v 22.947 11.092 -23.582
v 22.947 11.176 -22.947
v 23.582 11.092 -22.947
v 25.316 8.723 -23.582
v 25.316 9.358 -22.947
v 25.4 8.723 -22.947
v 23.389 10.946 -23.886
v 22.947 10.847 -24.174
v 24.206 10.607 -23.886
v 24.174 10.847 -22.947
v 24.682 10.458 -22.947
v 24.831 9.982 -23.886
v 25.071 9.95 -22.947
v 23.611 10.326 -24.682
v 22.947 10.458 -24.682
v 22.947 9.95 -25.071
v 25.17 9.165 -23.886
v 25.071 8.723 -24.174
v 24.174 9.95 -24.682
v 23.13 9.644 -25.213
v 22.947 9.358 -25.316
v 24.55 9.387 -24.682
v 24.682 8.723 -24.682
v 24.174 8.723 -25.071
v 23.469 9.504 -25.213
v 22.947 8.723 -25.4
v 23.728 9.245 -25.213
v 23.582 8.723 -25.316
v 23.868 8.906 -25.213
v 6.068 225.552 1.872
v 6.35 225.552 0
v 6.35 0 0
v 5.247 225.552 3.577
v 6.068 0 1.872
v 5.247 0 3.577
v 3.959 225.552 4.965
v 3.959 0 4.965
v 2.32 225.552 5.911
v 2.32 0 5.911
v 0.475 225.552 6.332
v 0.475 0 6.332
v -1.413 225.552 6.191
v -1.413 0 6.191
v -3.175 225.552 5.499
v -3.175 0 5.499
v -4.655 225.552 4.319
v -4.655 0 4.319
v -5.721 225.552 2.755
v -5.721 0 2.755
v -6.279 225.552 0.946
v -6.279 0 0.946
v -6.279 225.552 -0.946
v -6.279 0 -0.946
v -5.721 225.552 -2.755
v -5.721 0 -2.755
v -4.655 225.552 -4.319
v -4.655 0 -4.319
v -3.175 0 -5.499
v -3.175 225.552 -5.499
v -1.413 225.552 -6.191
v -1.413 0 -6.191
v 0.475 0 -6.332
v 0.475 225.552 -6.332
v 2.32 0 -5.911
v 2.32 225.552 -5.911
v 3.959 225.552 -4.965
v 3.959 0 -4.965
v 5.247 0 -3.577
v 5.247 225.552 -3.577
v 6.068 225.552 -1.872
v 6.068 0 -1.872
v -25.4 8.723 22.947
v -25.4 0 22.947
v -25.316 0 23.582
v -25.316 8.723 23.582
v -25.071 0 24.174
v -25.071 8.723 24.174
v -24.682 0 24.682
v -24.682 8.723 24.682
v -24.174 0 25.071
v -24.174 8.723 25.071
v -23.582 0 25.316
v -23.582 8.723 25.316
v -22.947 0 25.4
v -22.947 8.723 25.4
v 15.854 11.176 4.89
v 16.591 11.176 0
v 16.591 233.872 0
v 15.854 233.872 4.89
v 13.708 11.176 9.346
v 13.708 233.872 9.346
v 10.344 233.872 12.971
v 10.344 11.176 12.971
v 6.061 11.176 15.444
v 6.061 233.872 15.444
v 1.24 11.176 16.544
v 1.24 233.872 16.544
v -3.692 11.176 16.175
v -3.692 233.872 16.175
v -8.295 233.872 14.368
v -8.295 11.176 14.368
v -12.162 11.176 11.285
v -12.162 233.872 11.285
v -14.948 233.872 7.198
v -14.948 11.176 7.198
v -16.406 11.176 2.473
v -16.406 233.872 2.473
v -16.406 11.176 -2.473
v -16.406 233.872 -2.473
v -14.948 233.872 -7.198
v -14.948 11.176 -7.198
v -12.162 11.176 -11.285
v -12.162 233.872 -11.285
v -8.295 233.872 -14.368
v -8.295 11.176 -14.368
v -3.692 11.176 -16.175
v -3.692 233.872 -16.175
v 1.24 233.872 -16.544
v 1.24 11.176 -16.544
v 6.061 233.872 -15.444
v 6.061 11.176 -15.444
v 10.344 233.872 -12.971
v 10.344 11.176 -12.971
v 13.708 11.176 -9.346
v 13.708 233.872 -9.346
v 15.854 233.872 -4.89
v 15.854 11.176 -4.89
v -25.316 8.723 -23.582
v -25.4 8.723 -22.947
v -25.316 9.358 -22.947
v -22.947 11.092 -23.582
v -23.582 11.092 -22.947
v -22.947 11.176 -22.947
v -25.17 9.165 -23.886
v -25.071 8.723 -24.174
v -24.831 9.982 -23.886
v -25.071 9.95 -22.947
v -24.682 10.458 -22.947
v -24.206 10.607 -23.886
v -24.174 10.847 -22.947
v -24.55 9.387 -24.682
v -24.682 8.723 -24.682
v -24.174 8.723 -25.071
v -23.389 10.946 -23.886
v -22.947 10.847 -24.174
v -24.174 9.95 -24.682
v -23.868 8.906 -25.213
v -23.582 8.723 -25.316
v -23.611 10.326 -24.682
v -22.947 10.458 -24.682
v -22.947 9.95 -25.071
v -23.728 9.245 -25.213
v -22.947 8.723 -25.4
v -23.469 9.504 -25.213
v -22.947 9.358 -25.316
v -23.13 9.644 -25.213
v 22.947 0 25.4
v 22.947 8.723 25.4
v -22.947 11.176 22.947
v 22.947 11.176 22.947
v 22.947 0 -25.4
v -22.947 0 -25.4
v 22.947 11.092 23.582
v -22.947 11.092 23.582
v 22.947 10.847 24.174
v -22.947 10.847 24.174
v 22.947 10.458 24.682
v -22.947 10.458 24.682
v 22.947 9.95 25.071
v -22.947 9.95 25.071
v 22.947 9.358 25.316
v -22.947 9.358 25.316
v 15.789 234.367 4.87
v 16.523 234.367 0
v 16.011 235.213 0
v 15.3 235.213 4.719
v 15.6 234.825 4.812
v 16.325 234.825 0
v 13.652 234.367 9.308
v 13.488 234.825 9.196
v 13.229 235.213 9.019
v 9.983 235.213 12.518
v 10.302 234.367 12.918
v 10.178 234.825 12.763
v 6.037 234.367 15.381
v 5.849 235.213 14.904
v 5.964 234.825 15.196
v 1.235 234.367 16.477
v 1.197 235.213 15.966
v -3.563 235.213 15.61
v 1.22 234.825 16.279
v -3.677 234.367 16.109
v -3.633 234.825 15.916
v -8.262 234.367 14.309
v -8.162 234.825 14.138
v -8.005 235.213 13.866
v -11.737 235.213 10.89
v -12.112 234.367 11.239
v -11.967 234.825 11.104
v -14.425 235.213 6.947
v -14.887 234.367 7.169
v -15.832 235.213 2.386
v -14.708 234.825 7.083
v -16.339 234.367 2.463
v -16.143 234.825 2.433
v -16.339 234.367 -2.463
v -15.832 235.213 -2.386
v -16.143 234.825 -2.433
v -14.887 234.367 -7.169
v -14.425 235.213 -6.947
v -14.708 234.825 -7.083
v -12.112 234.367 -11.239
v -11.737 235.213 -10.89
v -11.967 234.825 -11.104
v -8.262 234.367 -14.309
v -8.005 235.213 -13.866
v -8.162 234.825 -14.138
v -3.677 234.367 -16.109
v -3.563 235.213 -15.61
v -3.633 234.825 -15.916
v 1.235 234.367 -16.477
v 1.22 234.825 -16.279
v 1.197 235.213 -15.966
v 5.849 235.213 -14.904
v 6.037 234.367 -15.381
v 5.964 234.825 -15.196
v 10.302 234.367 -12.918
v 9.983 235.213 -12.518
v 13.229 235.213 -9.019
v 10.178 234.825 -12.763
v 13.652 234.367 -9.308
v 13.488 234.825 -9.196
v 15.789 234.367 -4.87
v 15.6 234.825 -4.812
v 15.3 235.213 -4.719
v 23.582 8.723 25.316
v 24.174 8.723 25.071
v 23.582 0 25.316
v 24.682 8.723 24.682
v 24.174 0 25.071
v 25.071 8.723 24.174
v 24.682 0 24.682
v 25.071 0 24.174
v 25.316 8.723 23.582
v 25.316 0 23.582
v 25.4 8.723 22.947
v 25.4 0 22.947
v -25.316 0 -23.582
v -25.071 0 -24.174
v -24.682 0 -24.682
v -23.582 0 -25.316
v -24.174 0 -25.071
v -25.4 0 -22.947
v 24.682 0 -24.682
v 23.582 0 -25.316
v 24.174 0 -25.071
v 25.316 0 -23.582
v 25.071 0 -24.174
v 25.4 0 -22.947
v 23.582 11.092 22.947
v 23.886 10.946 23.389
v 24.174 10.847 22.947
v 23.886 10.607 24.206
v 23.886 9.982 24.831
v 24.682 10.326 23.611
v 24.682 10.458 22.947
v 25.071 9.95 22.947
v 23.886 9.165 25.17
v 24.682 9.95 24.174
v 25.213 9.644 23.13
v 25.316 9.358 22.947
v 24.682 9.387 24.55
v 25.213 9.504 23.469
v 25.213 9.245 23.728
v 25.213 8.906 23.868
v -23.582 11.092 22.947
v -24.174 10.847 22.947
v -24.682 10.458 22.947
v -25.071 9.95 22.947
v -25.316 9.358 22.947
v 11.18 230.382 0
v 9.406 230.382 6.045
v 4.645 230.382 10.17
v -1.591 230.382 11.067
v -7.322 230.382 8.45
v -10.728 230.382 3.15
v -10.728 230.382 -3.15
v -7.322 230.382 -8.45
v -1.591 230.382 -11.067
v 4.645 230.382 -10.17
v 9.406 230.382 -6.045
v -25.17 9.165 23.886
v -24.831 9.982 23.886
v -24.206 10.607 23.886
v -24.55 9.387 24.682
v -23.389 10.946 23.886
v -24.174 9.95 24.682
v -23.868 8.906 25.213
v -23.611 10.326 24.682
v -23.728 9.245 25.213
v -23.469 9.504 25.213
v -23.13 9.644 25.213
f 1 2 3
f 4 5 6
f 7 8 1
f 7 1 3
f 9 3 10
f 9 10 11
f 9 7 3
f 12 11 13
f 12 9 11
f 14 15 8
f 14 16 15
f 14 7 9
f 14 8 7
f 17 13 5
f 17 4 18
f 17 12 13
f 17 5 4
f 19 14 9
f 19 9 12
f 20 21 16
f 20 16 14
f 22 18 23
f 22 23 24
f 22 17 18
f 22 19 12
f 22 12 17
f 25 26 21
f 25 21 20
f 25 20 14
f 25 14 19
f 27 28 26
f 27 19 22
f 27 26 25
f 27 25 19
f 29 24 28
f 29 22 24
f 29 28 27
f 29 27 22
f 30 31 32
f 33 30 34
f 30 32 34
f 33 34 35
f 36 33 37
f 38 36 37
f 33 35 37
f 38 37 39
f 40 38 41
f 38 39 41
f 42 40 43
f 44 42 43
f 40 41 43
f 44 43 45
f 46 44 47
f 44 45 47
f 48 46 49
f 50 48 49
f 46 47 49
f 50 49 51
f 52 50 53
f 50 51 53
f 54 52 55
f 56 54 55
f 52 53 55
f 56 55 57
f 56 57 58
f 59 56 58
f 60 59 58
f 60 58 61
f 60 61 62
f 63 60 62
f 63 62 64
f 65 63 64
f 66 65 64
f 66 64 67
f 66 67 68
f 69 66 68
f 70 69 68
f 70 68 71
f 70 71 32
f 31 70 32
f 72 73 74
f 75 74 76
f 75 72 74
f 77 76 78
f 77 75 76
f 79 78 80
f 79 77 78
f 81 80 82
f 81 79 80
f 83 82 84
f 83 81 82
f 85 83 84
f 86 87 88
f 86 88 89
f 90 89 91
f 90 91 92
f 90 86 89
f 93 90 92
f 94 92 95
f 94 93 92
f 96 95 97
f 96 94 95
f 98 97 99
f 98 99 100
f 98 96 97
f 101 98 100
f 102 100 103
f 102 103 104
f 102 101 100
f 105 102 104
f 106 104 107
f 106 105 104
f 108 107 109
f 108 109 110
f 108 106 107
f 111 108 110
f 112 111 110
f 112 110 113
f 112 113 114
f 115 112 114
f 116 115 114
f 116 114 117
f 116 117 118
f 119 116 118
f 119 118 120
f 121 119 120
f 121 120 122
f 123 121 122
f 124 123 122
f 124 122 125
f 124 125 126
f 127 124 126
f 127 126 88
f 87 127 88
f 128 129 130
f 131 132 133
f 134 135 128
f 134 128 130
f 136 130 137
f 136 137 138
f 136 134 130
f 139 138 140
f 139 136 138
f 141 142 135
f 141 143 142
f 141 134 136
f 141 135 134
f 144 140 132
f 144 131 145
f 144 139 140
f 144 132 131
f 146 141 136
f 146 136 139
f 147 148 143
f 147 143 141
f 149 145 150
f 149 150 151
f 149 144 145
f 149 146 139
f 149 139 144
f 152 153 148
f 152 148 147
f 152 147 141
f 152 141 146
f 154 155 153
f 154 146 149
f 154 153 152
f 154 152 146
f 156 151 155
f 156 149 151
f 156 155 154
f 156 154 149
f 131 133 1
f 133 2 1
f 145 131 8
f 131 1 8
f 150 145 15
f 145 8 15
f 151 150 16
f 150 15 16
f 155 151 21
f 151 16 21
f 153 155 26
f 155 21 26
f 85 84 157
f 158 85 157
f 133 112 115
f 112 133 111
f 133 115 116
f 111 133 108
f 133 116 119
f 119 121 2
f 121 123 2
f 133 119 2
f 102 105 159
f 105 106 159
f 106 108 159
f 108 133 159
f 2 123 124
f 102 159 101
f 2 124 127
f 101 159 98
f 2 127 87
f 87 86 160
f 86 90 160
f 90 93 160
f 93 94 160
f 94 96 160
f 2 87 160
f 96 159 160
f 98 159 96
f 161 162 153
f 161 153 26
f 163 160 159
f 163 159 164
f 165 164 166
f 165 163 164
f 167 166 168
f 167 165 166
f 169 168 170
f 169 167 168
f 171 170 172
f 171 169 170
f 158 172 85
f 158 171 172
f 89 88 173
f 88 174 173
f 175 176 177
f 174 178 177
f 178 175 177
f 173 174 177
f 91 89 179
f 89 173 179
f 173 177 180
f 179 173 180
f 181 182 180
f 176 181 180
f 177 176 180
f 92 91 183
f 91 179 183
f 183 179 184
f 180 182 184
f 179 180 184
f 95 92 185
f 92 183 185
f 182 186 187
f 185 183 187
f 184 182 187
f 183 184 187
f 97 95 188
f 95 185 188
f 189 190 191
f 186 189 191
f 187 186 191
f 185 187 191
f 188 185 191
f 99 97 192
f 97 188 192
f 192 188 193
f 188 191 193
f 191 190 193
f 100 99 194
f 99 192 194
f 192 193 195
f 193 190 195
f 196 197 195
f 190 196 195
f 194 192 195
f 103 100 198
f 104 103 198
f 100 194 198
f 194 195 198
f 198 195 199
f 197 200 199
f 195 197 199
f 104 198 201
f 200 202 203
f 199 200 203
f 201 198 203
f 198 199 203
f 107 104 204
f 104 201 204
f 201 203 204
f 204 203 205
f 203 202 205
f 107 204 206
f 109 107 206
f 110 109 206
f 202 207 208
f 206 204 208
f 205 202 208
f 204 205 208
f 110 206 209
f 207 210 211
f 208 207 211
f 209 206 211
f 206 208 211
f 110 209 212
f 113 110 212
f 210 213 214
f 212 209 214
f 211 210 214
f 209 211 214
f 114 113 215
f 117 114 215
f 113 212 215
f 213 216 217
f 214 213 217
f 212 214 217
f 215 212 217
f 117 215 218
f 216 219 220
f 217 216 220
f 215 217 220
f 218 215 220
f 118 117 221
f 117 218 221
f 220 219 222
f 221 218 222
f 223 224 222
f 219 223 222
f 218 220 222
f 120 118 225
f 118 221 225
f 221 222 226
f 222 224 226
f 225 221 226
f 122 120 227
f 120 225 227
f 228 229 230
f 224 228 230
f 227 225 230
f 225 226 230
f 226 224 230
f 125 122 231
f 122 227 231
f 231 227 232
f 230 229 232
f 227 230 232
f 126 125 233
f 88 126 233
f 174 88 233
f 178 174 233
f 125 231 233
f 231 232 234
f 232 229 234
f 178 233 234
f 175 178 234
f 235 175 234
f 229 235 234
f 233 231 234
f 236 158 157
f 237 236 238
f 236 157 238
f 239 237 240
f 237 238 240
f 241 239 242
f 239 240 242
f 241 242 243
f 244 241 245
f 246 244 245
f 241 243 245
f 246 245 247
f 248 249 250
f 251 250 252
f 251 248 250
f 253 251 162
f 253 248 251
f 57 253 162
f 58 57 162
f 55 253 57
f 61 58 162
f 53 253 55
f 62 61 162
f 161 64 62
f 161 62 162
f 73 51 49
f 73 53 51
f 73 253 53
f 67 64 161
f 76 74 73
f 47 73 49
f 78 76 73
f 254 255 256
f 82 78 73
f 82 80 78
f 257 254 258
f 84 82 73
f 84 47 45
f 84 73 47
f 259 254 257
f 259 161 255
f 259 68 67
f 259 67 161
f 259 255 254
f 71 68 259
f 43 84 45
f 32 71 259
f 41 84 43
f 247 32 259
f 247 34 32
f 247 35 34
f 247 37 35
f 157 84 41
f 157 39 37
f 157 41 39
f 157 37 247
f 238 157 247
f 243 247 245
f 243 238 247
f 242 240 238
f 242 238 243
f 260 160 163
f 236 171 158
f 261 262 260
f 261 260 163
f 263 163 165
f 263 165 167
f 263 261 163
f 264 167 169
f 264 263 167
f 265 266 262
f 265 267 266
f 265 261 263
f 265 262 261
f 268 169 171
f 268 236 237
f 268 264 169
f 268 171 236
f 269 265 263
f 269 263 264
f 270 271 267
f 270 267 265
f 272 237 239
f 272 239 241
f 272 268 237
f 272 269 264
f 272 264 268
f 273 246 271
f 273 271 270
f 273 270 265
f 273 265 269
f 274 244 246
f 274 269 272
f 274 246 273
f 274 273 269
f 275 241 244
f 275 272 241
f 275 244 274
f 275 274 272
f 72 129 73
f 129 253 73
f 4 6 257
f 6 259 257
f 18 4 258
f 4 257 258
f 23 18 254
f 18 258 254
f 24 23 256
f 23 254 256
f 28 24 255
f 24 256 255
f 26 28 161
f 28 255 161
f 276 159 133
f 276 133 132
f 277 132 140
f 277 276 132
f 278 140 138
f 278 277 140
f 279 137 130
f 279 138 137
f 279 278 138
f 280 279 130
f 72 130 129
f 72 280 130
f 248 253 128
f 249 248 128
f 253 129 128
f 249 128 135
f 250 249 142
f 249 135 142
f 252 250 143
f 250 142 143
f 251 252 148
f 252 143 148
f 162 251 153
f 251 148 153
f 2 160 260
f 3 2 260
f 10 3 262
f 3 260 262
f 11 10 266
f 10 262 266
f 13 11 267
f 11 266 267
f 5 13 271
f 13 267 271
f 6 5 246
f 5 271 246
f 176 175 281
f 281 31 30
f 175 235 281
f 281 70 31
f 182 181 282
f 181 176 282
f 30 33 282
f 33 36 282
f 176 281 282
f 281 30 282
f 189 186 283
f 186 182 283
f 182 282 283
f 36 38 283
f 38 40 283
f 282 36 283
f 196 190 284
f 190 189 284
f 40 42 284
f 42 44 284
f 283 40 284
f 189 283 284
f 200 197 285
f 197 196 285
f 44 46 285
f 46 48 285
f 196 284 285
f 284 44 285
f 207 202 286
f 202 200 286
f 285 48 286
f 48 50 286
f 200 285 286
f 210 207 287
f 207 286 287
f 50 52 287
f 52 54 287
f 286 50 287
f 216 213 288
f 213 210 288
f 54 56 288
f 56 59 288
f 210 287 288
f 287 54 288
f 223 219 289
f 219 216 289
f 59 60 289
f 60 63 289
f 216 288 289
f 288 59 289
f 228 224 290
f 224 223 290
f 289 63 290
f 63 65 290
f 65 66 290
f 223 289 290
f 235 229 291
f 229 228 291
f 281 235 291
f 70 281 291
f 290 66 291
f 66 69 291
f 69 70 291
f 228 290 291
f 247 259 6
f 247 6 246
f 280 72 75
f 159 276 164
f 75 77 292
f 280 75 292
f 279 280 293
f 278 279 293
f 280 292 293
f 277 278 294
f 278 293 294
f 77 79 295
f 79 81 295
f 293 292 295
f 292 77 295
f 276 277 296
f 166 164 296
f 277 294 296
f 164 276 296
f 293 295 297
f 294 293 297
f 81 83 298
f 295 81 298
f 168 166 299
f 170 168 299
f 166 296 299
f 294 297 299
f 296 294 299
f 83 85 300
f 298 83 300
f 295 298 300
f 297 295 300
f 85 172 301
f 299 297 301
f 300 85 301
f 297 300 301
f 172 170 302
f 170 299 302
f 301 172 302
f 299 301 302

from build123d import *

# Parameters (mm, degrees)
F0_W     = 50.8
F0_H     = 50.8
F0_R     = 16.5908146865
F1_DEPTH = 11.176
F0_R_2   = 6.35
F2_DEPTH = 235.712
F3_R     = 2.4528409794
F4_R     = 2.4528409794
F5_R     = 2.4528409794
F6_R     = 2.4528409794
F7_R     = 1.8396307345


# Not quite as in the source:
# - a fillet or chamfer that OpenCascade refuses, or shapes differently, is made with other operations: its cross-section is extruded or revolved along the edge and cut away or added


with BuildPart() as f1:
    # F0 (on Front) → F1 (new body)
    with BuildSketch(Plane.XZ):
        Rectangle(F0_W, F0_H)
        Circle(F0_R, mode=Mode.SUBTRACT)
    extrude(amount=-F1_DEPTH)

    # F0 (on Front) → F2 (join)
    with BuildSketch(Plane.XZ):
        Circle(F0_R)
        Circle(F0_R_2, mode=Mode.SUBTRACT)
    extrude(amount=-F2_DEPTH)

    # F3
    f3_edges = [f1.edges().sort_by_distance(p)[0] for p in [
        (-25.4, 11.176, 0),
    ]]
    fillet(f3_edges, radius=F3_R)

    # F4
    f4_edges = [f1.edges().sort_by_distance(p)[0] for p in [
        (1.22642, 11.176, 25.4),
    ]]
    fillet(f4_edges, radius=F4_R)

    # F5
    f5_edges = [f1.edges().sort_by_distance(p)[0] for p in [
        (25.4, 11.176, -1.22642),
    ]]
    fillet(f5_edges, radius=F5_R)

    # F6
    f6_edges = [f1.edges().sort_by_distance(p)[0] for p in [
        (0, 11.176, -25.4),
    ]]
    fillet(f6_edges, radius=F6_R)

    # F7
    f7_edges = [f1.edges().sort_by_distance(p)[0] for p in [
        (-16.590815, 235.712, 0),
    ]]
    fillet(f7_edges, radius=F7_R)

    # F8: chamfer of 10.16 on 1 edges, made by hand

    # F8_s1 → F8_t2 (revolve, cut)
    with BuildSketch(Plane.XY):
        Polygon((16.51, 235.712), (6.35, 225.552), (6.35, 235.712), align=None)
    revolve(axis=Axis((0, 235.712, 0), (0, -1, 0)), mode=Mode.SUBTRACT)


solid = f1.part
